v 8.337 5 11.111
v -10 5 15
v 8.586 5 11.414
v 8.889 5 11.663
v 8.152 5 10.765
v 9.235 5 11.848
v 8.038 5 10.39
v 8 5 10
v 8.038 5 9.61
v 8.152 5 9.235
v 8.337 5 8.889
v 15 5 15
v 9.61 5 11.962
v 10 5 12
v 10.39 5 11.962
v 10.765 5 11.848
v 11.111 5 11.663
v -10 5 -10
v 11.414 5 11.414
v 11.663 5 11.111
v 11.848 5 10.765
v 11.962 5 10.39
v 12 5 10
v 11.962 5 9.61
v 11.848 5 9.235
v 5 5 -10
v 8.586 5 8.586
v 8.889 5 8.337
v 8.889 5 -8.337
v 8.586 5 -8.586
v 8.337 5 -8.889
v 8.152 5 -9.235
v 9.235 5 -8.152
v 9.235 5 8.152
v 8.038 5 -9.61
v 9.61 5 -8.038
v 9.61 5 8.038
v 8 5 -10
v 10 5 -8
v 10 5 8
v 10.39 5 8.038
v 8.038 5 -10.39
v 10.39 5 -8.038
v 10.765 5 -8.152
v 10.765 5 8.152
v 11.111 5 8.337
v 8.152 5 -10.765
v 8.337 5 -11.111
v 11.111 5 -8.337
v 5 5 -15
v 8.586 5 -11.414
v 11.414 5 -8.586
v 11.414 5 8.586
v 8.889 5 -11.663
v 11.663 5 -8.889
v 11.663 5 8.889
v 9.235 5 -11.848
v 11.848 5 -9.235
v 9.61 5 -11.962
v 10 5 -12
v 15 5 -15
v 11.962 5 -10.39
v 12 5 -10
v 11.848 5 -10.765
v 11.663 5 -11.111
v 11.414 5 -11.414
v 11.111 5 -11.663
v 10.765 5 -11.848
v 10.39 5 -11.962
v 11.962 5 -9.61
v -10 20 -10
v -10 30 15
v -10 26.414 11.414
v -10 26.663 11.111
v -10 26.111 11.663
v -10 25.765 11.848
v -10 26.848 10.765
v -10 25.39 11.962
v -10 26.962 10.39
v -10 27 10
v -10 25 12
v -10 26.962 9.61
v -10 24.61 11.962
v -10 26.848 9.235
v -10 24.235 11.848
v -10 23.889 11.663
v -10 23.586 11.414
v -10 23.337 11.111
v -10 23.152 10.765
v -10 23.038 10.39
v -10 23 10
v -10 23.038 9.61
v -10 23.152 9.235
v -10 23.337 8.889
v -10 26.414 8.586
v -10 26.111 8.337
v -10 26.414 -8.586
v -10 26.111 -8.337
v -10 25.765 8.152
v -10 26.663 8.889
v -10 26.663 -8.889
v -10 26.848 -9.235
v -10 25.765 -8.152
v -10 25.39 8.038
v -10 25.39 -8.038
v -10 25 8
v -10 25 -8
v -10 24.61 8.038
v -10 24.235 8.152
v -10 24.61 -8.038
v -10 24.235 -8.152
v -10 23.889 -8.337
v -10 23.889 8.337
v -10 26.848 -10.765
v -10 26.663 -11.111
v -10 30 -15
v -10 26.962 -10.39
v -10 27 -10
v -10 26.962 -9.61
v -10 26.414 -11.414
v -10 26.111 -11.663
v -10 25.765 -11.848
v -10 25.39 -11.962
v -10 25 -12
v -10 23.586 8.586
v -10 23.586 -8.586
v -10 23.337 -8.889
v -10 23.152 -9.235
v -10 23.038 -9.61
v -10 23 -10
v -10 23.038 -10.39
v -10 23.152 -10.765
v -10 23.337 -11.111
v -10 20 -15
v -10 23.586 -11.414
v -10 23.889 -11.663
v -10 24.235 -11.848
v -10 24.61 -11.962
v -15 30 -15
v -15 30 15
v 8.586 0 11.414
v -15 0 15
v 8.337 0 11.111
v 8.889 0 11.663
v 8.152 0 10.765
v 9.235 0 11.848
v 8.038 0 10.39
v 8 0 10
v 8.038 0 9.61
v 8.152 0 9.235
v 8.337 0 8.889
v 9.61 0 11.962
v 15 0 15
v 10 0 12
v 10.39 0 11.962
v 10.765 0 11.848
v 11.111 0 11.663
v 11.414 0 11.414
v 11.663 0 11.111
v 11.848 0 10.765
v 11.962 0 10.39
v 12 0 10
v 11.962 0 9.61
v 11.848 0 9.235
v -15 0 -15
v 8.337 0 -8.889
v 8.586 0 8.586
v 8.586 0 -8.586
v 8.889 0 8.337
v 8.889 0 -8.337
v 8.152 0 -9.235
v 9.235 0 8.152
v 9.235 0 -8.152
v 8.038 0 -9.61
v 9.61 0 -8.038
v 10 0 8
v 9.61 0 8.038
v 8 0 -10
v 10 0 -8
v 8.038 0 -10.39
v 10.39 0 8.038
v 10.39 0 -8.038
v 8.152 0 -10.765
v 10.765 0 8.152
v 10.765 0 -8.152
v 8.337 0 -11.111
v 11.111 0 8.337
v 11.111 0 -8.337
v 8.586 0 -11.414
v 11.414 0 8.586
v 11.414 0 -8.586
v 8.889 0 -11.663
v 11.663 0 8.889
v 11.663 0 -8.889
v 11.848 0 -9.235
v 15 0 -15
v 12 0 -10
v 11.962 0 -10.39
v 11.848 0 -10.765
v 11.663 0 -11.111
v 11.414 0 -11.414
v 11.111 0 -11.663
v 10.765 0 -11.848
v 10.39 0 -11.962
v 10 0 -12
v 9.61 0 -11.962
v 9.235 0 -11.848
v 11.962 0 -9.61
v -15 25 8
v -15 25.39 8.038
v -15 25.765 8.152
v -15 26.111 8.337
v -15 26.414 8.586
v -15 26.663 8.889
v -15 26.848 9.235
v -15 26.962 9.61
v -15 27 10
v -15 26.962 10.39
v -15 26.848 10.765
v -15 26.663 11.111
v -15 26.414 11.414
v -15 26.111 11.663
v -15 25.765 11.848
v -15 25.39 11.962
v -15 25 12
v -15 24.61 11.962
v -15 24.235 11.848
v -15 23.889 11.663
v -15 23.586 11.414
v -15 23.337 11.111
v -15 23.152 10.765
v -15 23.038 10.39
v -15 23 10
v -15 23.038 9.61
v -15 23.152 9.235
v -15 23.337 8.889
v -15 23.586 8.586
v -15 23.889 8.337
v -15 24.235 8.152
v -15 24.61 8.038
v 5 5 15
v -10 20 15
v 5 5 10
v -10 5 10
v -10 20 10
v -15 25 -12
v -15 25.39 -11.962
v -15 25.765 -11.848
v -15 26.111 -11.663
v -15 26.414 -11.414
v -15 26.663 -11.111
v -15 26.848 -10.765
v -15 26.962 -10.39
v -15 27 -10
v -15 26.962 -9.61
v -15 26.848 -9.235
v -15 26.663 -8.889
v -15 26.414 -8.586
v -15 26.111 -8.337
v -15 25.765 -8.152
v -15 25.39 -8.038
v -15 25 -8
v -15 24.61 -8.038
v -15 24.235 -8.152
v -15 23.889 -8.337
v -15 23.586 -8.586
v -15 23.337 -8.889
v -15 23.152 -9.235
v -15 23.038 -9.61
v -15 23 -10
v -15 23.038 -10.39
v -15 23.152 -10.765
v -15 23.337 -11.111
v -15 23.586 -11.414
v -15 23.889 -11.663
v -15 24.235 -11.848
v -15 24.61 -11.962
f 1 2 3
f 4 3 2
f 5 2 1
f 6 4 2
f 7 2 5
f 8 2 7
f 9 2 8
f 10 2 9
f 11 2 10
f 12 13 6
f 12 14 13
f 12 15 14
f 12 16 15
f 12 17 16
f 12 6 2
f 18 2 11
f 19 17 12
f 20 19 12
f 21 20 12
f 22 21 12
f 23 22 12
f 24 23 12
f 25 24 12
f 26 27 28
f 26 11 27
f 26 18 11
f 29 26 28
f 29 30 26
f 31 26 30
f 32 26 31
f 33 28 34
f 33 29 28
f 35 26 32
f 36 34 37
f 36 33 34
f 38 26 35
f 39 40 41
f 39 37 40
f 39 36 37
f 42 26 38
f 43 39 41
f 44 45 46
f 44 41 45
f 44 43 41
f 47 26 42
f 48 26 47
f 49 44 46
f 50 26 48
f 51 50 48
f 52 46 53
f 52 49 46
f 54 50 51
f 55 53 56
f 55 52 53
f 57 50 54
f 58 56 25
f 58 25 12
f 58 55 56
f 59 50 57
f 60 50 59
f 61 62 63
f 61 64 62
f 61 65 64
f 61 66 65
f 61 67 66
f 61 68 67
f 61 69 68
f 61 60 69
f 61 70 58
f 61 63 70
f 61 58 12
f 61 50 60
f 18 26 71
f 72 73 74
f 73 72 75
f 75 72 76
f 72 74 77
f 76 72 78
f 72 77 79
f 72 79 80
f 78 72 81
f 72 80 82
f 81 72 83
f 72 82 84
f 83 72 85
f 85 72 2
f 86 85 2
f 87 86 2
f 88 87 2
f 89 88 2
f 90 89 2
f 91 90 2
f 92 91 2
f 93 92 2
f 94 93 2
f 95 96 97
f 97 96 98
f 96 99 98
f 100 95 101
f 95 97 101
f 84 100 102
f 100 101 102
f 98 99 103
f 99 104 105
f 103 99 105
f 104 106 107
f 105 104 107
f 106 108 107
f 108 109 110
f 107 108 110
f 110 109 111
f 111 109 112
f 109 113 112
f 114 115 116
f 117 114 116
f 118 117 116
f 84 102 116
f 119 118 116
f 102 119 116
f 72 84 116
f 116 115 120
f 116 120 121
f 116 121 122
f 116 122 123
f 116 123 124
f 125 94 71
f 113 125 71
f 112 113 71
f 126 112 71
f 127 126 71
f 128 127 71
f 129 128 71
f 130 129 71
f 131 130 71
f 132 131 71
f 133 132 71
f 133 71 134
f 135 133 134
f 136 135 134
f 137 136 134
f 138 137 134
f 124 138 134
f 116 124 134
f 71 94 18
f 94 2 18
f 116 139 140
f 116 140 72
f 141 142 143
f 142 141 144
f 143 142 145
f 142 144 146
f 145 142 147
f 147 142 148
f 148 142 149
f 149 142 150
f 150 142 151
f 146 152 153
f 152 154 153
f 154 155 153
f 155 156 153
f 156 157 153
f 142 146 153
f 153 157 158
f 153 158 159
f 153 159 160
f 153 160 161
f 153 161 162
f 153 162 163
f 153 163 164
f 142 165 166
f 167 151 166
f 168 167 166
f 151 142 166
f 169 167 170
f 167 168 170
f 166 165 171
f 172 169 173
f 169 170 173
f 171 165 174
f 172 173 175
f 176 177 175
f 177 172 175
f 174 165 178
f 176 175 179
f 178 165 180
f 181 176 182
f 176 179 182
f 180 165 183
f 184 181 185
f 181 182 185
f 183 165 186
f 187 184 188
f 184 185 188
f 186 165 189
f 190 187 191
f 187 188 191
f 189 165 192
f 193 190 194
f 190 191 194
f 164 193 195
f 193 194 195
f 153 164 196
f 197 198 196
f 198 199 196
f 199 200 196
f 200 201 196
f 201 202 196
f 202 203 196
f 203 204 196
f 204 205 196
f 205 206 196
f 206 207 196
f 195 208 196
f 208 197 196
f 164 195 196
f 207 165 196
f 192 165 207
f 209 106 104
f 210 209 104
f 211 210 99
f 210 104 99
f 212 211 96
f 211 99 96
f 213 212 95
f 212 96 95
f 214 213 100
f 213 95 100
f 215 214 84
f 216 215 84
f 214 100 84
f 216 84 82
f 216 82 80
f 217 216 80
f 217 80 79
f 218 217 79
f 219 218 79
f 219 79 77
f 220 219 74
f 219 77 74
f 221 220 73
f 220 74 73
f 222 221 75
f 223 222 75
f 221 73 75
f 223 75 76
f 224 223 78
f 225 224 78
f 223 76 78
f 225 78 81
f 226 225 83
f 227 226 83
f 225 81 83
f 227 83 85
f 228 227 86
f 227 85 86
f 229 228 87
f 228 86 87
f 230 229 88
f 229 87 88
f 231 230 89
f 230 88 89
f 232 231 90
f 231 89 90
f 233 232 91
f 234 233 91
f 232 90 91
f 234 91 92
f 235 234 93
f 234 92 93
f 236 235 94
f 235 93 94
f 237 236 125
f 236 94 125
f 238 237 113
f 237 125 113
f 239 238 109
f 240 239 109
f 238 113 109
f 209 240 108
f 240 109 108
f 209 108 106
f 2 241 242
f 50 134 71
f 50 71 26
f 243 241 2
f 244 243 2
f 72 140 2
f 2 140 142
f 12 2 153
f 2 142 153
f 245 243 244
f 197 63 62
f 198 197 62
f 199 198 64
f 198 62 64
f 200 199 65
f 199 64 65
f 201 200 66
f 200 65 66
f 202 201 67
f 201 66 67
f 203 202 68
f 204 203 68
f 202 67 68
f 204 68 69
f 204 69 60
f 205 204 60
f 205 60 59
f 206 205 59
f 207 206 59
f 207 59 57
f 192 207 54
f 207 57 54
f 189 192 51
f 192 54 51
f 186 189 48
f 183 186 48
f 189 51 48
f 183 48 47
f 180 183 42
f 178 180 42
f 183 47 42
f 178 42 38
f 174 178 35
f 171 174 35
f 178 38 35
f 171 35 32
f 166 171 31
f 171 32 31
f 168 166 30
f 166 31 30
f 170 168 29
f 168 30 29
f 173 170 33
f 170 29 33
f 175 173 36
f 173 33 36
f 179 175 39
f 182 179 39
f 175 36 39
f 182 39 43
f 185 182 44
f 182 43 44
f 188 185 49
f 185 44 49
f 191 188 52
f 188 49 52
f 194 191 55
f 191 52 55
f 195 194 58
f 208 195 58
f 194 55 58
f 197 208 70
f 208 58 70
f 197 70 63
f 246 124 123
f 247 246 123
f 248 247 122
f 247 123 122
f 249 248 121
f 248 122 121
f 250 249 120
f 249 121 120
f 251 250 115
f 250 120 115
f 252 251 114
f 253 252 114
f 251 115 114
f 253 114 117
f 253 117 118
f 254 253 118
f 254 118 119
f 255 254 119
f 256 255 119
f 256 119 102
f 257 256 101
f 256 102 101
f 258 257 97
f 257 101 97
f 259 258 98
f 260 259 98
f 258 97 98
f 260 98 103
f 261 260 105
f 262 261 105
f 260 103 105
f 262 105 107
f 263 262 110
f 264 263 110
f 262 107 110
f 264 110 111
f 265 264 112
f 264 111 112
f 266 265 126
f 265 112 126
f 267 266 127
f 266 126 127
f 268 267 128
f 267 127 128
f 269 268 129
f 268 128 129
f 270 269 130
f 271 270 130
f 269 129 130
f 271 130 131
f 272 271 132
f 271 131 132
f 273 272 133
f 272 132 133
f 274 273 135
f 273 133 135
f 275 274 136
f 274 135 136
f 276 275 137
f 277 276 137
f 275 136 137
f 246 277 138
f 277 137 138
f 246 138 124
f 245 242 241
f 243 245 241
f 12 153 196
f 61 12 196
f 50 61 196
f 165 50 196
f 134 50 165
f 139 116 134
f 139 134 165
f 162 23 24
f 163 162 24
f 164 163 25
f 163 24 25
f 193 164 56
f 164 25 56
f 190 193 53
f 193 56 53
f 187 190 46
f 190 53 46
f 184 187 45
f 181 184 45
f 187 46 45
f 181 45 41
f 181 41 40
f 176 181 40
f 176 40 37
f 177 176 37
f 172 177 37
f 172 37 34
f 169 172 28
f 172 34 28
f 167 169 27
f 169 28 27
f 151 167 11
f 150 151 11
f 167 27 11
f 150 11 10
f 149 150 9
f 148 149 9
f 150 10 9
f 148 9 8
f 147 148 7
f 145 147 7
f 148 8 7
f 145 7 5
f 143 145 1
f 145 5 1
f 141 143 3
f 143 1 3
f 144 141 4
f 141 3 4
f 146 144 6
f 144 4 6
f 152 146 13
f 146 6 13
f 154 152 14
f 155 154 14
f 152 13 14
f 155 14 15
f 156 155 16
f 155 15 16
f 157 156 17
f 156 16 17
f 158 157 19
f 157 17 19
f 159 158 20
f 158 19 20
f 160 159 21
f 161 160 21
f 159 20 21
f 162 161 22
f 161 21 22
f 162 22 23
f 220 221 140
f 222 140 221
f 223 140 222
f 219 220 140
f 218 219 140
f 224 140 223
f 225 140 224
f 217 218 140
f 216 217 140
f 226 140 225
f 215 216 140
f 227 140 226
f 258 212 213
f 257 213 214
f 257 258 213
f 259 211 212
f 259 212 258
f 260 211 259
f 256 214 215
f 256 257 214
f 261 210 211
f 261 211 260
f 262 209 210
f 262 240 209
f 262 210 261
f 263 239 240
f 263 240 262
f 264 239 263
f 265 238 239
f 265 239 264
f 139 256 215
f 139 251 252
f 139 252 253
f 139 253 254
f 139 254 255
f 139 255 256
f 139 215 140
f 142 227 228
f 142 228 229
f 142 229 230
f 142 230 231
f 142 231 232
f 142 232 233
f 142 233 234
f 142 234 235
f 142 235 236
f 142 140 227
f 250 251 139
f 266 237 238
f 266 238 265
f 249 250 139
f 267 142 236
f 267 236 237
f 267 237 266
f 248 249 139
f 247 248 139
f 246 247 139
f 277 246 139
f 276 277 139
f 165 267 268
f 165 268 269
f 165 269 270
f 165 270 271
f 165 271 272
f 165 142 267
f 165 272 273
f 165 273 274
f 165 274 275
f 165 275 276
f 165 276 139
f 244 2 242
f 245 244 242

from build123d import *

# Parameters (mm, degrees)
SKETCH1_W           = 30
SKETCH1_H           = 30
BOSS_EXTRUDE1_DEPTH = 5
SKETCH2_W           = 5
SKETCH2_H           = 30
BOSS_EXTRUDE2_DEPTH = 25
BOSS_EXTRUDE3_DEPTH = 5
BOSS_EXTRUDE4_DEPTH = 5
SKETCH10_R          = 2
CUT_EXTRUDE1_DEPTH  = 5
SKETCH11_R          = 2
CUT_EXTRUDE2_DEPTH  = 5


with BuildPart() as part:
    # Sketch1 → Boss-Extrude1 (new body)
    with BuildSketch(Plane(origin=(0, 0, 0), x_dir=(1, 0, 0), z_dir=(0, 1, 0))):
        Rectangle(SKETCH1_W, SKETCH1_H)
    extrude(amount=BOSS_EXTRUDE1_DEPTH)

    # Sketch2 → Boss-Extrude2 (add)
    with BuildSketch(Plane(origin=(0, 5, 0), x_dir=(1, 0, 0), z_dir=(0, 1, 0))):
        with Locations((-12.5, 0)):
            Rectangle(SKETCH2_W, SKETCH2_H)
    extrude(amount=BOSS_EXTRUDE2_DEPTH)

    # Sketch5 → Boss-Extrude4 (add)
    with BuildSketch(Plane.XY.offset(-15)):
        Polygon((-10, 5), (-10, 20), (5, 5), align=None)
    extrude(amount=BOSS_EXTRUDE4_DEPTH)

    # Sketch10 → Cut-Extrude1 (cut)
    with BuildSketch(Plane(origin=(-10, 0, 0), x_dir=(0, 0, -1), z_dir=(1, 0, 0))):
        with Locations((-10, 25)):
            Circle(SKETCH10_R)
        with Locations((10, 25)):
            Circle(SKETCH10_R)
    extrude(amount=-CUT_EXTRUDE1_DEPTH, mode=Mode.SUBTRACT)

    # Sketch11 → Cut-Extrude2 (cut)
    with BuildSketch(Plane(origin=(0, 5, 0), x_dir=(1, 0, 0), z_dir=(0, 1, 0))):
        with Locations((10, 10)):
            Circle(SKETCH11_R)
        with Locations((10, -10)):
            Circle(SKETCH11_R)
    extrude(amount=-CUT_EXTRUDE2_DEPTH, mode=Mode.SUBTRACT)


with BuildPart() as body_2:
    # Sketch3 → Boss-Extrude3 (new body)
    with BuildSketch(Plane.XY.offset(15)):
        Polygon((-10, 5), (-10, 20), (5, 5), align=None)
    extrude(amount=-BOSS_EXTRUDE3_DEPTH)


solid = Compound([part.part, body_2.part])
